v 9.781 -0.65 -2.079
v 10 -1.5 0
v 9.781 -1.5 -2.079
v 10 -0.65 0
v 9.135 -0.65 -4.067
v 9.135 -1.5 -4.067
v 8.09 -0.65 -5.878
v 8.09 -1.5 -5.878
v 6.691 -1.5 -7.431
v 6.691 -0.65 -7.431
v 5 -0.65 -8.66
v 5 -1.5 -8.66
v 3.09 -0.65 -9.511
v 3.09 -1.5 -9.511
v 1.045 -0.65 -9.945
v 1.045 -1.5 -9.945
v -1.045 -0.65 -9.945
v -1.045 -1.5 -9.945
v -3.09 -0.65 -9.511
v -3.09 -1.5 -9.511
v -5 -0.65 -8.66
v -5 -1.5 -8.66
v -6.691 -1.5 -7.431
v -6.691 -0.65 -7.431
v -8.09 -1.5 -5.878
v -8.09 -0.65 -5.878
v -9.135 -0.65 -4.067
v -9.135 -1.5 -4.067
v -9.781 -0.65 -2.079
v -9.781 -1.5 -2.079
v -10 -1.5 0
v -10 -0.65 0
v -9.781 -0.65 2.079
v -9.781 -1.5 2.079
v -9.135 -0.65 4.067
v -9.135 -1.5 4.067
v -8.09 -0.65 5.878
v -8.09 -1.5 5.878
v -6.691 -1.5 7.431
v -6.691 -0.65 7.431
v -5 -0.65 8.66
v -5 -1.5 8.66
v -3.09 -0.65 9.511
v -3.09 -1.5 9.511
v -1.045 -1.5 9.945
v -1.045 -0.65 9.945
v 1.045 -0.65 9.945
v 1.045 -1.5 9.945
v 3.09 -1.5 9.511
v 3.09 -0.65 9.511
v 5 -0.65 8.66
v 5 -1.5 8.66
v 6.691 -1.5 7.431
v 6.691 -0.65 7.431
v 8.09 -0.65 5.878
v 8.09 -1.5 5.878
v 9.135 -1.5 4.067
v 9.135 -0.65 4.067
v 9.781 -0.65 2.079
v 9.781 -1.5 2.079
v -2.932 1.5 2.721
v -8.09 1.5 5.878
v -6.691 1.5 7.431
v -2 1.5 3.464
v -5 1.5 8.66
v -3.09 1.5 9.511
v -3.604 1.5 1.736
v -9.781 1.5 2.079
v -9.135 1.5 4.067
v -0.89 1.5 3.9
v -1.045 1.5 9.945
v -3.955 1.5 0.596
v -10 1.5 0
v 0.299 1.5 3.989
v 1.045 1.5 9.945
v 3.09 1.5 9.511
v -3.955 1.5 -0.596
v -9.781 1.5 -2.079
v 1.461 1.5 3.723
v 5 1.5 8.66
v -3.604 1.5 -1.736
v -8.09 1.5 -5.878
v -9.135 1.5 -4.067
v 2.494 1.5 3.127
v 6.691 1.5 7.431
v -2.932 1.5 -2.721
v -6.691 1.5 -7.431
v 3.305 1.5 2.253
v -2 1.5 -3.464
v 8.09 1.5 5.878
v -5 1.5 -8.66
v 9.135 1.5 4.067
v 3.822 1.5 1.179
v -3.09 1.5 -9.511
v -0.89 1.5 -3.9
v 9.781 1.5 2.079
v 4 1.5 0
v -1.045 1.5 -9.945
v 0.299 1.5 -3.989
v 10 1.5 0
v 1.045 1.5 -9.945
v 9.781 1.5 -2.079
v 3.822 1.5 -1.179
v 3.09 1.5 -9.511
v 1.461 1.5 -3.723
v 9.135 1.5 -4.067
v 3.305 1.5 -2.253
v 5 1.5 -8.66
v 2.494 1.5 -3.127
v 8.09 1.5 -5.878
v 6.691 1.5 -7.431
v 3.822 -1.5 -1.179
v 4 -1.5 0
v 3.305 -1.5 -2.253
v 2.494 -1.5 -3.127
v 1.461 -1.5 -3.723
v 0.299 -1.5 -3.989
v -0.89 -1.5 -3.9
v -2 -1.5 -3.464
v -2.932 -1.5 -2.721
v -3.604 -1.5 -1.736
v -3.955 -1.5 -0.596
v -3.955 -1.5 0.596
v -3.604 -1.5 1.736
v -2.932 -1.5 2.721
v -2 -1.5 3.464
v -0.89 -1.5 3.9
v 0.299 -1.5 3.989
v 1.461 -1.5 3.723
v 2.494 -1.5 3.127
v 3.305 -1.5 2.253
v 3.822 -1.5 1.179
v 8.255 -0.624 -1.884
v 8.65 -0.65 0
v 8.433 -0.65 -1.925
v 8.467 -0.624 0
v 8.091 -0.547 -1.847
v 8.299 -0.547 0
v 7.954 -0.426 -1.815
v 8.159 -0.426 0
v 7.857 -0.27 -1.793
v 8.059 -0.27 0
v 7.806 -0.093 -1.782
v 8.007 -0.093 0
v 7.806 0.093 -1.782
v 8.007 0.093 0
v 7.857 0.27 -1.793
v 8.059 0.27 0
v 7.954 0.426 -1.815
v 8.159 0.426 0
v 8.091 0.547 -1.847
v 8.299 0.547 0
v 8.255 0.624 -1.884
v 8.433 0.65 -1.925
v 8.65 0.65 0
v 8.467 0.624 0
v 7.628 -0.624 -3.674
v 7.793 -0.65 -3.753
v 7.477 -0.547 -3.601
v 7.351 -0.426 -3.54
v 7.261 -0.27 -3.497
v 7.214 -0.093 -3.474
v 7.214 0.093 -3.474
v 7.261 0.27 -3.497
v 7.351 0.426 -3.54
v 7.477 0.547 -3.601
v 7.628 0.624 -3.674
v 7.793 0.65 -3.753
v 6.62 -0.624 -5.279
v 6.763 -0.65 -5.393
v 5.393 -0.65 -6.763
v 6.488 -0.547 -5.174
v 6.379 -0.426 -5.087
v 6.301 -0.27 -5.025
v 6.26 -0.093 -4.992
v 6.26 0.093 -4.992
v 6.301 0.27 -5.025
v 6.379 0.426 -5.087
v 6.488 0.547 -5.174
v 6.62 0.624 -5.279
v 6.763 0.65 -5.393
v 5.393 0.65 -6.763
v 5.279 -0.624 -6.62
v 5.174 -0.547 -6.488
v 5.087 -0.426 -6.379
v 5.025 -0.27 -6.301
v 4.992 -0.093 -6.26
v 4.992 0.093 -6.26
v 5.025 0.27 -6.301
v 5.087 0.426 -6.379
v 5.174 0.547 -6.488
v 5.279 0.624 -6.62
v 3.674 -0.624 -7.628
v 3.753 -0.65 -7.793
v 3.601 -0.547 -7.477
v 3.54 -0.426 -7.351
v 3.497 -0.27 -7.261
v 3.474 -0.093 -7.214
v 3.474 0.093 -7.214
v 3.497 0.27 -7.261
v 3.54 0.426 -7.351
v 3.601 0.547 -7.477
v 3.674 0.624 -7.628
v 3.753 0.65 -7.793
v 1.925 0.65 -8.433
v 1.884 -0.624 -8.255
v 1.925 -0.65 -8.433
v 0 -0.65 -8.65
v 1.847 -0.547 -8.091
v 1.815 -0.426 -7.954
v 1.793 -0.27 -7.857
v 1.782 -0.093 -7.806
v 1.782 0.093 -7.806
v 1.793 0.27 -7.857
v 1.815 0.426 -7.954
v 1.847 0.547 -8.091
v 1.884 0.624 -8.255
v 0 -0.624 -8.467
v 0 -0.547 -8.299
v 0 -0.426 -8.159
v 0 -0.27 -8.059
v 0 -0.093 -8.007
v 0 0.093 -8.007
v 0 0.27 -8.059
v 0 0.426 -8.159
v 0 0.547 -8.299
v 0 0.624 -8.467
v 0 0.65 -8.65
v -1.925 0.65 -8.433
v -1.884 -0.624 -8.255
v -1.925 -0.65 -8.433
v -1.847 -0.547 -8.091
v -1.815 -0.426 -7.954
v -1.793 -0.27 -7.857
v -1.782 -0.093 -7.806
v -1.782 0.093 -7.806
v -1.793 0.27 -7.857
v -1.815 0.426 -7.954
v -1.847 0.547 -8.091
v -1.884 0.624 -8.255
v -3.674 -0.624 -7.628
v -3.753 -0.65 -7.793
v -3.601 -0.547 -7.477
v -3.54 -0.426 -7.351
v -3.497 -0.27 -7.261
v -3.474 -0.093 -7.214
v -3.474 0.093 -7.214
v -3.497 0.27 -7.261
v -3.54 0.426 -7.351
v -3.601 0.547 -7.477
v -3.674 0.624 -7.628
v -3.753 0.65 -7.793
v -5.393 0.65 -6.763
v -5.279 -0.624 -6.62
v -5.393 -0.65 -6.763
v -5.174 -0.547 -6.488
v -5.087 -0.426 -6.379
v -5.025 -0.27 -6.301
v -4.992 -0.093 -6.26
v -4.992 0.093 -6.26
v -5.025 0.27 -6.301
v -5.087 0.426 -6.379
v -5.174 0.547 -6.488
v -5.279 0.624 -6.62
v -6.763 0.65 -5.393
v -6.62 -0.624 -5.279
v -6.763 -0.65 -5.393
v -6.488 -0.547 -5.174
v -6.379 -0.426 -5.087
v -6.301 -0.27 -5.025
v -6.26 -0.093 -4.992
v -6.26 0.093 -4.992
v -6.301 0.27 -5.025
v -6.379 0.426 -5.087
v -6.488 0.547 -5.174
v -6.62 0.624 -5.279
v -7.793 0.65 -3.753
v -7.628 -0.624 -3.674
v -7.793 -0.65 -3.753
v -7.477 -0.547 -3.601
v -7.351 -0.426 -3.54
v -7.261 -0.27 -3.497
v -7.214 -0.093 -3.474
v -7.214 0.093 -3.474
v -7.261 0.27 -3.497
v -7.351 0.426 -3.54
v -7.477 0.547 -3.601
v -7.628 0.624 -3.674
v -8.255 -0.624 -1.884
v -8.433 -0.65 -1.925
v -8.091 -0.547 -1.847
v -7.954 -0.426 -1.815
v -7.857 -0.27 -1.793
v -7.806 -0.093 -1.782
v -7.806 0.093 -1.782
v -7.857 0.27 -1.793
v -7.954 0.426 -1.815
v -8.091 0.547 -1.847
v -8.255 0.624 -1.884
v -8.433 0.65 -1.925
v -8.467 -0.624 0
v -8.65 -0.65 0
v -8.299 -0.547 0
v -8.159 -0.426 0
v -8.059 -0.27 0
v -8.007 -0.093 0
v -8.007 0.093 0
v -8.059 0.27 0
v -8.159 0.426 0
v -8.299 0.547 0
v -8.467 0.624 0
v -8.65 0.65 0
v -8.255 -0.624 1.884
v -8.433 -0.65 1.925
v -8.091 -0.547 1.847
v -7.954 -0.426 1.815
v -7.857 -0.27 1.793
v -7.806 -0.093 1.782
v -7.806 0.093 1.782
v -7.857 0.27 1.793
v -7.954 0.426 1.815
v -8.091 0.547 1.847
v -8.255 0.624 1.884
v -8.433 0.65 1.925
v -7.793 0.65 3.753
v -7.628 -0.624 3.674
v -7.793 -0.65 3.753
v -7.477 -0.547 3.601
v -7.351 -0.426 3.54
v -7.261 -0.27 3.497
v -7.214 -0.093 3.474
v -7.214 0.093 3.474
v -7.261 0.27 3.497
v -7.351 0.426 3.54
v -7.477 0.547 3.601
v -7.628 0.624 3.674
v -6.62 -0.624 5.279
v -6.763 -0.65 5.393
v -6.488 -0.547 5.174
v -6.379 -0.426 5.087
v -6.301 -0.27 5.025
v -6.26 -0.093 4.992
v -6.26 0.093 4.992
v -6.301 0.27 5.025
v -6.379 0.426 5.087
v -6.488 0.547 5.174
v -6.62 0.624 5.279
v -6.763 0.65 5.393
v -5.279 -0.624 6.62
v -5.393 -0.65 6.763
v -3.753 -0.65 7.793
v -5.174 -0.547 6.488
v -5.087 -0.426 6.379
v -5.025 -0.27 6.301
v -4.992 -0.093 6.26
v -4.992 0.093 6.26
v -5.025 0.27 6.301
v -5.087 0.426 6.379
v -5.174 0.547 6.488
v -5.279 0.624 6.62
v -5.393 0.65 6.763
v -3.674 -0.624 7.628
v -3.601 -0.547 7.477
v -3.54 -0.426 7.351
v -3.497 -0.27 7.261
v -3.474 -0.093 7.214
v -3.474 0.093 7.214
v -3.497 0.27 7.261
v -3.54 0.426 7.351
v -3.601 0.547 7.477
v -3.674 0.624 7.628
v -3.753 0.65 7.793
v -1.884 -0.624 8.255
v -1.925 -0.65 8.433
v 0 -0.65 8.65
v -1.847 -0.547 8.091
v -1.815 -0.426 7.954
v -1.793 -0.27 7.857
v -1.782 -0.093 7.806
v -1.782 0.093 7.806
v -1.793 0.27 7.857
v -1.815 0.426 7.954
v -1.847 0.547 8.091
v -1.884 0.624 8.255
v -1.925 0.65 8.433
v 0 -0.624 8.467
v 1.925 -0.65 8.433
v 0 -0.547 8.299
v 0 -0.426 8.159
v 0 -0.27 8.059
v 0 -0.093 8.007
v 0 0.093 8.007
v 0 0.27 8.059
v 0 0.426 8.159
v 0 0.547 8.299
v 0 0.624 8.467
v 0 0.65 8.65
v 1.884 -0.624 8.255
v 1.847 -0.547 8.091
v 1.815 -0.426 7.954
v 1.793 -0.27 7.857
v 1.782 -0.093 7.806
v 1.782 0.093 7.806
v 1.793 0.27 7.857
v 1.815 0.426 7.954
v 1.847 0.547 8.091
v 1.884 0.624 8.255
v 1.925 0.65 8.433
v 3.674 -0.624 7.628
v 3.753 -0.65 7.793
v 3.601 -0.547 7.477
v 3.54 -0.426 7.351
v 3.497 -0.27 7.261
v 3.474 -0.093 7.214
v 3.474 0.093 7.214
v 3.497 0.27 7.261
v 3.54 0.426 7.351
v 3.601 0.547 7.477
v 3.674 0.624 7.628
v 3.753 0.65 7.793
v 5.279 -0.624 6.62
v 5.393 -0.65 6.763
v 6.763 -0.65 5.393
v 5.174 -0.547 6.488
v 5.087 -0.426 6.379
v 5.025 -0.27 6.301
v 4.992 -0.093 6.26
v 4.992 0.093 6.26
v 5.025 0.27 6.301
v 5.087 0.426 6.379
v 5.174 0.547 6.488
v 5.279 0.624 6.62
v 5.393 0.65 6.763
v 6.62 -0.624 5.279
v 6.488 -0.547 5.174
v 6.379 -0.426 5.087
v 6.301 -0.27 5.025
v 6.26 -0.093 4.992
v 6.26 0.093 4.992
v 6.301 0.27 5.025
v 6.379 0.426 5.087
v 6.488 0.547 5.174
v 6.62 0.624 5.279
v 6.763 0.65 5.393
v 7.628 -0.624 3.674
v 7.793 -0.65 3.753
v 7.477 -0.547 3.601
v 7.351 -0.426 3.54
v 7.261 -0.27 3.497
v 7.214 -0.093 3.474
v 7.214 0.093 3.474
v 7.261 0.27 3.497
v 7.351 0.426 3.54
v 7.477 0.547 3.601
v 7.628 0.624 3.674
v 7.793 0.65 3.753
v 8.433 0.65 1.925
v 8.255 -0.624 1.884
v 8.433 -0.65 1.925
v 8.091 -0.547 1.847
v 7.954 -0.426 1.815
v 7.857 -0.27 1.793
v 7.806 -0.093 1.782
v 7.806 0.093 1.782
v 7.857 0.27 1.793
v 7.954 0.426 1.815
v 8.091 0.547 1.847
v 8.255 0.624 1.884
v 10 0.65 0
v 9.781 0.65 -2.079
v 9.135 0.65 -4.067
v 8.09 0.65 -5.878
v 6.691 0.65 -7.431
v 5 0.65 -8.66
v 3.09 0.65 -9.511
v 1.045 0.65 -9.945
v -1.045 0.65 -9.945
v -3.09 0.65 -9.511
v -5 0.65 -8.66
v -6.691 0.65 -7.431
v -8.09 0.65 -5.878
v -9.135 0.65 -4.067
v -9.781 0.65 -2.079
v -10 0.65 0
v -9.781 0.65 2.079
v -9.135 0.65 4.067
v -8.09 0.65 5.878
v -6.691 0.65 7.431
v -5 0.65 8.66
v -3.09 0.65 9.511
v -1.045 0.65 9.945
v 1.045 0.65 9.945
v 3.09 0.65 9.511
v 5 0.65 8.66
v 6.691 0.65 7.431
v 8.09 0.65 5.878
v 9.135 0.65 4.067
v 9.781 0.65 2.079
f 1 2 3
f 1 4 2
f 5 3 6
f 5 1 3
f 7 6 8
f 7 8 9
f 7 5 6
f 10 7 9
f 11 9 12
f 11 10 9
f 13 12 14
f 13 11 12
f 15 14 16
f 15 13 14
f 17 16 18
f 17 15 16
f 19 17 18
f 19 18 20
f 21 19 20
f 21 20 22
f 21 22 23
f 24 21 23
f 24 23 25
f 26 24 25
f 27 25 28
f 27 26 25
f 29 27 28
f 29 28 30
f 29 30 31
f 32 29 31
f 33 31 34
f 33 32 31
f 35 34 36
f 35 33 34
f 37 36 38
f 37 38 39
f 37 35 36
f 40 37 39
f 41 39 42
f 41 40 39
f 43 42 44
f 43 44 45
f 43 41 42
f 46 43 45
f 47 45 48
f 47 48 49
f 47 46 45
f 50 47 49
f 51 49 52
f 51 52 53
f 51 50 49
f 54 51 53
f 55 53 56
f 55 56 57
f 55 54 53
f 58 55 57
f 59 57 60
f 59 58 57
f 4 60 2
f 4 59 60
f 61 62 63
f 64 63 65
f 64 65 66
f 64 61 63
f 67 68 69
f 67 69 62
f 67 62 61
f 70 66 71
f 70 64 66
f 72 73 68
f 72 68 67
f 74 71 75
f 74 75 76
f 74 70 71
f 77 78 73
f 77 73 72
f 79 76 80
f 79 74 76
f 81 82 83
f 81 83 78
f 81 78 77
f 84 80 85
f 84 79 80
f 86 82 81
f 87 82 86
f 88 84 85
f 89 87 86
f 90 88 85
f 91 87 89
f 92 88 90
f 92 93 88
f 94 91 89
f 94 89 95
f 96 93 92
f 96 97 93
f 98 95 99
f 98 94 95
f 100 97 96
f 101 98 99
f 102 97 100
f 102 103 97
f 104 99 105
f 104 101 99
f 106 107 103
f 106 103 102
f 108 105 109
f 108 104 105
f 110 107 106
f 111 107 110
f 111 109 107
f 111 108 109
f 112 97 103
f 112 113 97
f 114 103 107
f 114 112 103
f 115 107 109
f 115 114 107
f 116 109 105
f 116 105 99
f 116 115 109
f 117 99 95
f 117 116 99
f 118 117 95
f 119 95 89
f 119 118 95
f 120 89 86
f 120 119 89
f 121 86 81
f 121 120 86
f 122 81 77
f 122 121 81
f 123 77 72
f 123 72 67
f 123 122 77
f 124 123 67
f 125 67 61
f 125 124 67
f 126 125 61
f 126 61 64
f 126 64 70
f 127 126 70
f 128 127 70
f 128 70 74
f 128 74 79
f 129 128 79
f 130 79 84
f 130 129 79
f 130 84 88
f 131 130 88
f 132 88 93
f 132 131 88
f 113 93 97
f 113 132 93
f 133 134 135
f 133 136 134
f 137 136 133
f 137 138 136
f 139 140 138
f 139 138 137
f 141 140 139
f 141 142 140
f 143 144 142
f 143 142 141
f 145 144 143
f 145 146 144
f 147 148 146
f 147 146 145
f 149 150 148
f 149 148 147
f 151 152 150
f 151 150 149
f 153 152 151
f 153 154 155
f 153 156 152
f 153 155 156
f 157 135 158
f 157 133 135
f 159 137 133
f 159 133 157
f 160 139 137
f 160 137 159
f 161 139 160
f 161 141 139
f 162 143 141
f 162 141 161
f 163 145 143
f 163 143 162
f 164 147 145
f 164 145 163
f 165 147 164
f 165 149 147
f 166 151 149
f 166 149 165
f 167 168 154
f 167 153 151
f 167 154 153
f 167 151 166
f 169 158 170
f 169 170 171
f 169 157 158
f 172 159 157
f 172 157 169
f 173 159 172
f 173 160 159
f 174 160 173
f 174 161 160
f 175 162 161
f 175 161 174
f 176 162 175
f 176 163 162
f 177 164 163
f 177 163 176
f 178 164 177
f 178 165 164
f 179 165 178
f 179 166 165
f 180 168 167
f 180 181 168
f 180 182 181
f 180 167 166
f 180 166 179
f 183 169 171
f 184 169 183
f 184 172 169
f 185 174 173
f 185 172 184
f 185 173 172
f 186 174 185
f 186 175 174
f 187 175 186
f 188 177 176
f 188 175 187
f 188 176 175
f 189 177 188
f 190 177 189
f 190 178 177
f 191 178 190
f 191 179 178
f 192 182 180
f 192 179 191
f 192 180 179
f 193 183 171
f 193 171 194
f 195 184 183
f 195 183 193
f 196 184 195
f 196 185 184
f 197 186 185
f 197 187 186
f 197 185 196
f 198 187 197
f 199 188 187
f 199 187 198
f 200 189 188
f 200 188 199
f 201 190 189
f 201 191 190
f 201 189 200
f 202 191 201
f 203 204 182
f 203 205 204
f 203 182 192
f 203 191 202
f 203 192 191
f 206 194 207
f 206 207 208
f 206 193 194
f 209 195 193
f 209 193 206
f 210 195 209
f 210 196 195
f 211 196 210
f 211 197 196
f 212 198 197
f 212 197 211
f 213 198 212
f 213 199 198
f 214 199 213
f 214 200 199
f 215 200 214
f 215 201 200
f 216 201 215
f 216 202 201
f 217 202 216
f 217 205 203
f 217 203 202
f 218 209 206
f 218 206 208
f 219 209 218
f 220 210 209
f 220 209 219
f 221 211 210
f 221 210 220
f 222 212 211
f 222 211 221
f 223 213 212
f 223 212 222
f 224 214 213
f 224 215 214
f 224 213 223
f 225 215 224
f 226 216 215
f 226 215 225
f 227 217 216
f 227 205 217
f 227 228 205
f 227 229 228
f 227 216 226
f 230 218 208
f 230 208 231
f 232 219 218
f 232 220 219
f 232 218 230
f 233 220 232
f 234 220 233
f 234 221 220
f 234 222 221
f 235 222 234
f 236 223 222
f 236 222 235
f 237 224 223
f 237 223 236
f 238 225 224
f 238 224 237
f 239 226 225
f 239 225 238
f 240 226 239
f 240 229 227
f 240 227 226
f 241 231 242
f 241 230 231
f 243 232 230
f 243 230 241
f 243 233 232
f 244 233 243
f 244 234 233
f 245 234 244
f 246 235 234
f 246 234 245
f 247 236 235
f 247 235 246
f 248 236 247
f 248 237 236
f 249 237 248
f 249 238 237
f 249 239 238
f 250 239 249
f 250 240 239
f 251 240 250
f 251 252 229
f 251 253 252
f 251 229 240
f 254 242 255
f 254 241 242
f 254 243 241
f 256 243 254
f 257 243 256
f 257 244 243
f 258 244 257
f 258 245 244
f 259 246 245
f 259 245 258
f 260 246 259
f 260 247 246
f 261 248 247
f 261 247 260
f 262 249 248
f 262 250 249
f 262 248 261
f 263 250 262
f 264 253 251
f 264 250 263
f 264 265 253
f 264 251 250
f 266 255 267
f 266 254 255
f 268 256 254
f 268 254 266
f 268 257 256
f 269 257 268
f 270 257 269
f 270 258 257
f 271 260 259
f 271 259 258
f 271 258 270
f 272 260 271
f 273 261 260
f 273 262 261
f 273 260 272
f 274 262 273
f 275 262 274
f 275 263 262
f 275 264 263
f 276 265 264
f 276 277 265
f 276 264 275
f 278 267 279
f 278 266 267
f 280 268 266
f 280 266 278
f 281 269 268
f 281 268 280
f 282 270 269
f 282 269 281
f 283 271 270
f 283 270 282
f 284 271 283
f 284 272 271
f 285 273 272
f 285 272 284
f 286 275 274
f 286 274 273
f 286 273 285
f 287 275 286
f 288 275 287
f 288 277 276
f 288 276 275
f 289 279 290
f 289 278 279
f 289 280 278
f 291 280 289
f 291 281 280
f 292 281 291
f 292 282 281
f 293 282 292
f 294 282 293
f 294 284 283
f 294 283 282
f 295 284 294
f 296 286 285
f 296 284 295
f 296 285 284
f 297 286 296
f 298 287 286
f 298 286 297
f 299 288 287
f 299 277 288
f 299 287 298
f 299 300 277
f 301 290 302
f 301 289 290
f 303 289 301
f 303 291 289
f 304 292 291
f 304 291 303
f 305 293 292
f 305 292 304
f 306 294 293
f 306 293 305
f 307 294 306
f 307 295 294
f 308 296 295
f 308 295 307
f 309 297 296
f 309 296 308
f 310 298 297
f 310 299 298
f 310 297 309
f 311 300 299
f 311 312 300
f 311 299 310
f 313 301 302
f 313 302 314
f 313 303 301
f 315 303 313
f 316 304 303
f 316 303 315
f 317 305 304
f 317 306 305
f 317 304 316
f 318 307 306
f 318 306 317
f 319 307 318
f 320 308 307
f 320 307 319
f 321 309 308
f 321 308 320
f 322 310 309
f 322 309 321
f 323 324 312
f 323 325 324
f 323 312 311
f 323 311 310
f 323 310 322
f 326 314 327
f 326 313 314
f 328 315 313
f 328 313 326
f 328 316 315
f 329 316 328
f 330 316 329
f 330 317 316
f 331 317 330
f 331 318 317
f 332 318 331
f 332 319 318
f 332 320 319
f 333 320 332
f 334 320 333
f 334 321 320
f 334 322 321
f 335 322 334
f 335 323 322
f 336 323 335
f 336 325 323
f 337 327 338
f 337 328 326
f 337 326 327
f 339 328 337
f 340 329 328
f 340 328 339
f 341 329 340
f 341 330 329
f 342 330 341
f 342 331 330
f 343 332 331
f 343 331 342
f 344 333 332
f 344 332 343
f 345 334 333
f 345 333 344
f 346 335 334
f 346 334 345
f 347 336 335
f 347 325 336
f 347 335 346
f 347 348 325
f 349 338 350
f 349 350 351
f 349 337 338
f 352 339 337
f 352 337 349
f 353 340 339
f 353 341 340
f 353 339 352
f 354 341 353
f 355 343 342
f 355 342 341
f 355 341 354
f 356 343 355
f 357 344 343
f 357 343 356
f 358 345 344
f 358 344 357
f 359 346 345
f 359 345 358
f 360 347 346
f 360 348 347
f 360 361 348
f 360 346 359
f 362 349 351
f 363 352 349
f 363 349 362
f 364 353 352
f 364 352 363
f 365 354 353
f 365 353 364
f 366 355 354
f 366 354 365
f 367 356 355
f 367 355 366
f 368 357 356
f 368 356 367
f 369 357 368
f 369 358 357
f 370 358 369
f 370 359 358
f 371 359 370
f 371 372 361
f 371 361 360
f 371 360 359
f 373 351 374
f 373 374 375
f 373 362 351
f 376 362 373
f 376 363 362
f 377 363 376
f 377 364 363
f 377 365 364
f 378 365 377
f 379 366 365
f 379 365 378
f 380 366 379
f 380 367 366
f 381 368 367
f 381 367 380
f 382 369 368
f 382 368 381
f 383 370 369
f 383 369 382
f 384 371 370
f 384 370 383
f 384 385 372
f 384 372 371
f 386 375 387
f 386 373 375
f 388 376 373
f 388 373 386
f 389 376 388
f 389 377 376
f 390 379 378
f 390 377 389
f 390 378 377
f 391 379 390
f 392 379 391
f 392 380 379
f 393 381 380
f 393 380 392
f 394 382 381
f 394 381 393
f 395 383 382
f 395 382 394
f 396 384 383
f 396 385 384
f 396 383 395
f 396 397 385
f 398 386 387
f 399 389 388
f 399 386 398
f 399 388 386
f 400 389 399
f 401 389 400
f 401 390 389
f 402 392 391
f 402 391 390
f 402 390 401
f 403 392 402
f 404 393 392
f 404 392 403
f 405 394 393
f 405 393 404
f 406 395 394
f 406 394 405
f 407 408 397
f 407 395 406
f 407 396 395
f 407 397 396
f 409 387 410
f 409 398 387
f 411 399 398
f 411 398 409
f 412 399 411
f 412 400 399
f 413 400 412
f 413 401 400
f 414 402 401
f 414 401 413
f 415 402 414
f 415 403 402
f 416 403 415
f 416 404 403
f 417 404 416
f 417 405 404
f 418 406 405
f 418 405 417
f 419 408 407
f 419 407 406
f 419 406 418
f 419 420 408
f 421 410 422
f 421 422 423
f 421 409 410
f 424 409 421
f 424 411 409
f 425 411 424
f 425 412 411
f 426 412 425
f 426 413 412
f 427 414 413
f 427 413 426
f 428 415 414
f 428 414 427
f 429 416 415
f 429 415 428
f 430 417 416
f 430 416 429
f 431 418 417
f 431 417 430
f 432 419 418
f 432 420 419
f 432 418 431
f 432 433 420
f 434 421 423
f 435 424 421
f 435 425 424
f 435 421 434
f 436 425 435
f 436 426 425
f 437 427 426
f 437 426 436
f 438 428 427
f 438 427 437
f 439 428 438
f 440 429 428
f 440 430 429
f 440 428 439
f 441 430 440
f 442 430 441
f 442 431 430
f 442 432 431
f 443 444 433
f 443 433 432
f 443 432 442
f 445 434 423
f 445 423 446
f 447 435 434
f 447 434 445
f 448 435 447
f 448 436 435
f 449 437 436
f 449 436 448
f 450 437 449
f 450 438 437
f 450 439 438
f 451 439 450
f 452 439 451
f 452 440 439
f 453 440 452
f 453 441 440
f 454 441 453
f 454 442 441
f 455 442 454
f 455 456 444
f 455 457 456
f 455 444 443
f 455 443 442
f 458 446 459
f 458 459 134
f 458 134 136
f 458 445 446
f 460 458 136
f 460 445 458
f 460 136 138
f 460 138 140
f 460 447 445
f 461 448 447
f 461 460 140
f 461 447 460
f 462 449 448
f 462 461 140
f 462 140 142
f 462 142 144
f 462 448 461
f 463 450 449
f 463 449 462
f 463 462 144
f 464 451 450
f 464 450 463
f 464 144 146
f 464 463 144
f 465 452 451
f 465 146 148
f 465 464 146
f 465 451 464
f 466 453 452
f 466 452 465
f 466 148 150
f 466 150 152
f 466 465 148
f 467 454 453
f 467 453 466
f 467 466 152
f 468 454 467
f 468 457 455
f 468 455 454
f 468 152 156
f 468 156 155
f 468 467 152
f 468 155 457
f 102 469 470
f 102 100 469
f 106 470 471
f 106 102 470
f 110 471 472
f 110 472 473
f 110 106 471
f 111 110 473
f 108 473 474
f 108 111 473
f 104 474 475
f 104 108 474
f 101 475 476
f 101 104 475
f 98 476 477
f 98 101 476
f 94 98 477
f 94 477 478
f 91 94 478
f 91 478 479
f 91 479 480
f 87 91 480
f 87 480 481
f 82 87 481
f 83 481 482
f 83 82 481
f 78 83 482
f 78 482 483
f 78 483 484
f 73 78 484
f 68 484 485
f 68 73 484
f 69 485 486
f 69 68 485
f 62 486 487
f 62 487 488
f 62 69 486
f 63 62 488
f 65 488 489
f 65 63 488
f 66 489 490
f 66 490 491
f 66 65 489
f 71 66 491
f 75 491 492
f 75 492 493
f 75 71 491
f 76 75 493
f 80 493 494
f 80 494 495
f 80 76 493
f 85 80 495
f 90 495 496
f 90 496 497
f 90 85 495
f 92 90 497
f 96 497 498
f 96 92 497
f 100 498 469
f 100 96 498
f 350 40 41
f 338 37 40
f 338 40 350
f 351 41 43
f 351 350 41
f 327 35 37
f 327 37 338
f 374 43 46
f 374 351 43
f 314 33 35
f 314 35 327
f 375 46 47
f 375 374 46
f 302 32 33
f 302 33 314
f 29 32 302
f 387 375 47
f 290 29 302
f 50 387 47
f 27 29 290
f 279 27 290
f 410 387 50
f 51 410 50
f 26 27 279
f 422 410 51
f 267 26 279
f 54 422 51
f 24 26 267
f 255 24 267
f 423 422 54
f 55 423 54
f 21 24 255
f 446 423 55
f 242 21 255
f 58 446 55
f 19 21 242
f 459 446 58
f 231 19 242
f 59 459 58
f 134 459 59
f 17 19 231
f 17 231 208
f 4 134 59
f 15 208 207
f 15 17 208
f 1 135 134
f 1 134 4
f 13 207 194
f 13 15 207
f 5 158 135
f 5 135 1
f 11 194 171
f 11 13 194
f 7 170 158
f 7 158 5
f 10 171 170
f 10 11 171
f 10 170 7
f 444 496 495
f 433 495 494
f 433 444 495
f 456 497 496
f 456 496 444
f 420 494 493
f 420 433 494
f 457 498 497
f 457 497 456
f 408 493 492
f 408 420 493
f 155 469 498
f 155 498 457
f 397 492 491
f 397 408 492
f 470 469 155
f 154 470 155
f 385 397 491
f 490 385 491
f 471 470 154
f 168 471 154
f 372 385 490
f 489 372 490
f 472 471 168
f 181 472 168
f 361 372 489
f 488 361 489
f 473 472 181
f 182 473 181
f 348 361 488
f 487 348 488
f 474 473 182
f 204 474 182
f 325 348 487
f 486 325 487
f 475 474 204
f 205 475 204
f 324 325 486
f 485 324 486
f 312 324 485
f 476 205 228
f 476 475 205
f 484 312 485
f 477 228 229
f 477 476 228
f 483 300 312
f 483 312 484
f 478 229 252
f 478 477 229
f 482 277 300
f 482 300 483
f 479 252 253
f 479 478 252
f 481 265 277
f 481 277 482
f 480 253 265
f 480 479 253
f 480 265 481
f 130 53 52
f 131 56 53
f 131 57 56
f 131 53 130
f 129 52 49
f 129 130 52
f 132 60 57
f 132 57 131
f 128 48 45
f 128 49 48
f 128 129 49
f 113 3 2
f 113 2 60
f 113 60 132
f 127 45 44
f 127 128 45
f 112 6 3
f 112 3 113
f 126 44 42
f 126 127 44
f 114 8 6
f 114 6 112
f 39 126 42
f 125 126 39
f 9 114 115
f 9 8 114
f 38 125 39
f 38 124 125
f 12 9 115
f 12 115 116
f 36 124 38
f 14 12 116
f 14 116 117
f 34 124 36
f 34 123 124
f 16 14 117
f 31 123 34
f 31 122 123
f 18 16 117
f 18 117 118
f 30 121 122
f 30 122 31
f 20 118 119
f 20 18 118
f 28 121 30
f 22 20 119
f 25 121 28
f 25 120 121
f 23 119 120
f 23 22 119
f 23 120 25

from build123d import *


with BuildPart() as part:
    # Sketch1 → Revolve1 (revolve)
    with BuildSketch(Plane.XY):
        with BuildLine():
            Line((4, 1.5), (4, -1.5))
            Line((4, -1.5), (8.65, -1.5))
            Line((8.65, -1.5), (10, -1.5))
            Line((10, -1.5), (10, -0.65))
            Line((10, -0.65), (8.65, -0.65))
            ThreePointArc((8.65, -0.65), (8, 0), (8.65, 0.65))
            Line((8.65, 0.65), (10, 0.65))
            Line((10, 0.65), (10, 1.5))
            Line((10, 1.5), (8.65, 1.5))
            Line((8.65, 1.5), (4, 1.5))
        make_face()
    revolve(axis=Axis((0, -1.5, 0), (0, 1, 0)))


solid = part.part
